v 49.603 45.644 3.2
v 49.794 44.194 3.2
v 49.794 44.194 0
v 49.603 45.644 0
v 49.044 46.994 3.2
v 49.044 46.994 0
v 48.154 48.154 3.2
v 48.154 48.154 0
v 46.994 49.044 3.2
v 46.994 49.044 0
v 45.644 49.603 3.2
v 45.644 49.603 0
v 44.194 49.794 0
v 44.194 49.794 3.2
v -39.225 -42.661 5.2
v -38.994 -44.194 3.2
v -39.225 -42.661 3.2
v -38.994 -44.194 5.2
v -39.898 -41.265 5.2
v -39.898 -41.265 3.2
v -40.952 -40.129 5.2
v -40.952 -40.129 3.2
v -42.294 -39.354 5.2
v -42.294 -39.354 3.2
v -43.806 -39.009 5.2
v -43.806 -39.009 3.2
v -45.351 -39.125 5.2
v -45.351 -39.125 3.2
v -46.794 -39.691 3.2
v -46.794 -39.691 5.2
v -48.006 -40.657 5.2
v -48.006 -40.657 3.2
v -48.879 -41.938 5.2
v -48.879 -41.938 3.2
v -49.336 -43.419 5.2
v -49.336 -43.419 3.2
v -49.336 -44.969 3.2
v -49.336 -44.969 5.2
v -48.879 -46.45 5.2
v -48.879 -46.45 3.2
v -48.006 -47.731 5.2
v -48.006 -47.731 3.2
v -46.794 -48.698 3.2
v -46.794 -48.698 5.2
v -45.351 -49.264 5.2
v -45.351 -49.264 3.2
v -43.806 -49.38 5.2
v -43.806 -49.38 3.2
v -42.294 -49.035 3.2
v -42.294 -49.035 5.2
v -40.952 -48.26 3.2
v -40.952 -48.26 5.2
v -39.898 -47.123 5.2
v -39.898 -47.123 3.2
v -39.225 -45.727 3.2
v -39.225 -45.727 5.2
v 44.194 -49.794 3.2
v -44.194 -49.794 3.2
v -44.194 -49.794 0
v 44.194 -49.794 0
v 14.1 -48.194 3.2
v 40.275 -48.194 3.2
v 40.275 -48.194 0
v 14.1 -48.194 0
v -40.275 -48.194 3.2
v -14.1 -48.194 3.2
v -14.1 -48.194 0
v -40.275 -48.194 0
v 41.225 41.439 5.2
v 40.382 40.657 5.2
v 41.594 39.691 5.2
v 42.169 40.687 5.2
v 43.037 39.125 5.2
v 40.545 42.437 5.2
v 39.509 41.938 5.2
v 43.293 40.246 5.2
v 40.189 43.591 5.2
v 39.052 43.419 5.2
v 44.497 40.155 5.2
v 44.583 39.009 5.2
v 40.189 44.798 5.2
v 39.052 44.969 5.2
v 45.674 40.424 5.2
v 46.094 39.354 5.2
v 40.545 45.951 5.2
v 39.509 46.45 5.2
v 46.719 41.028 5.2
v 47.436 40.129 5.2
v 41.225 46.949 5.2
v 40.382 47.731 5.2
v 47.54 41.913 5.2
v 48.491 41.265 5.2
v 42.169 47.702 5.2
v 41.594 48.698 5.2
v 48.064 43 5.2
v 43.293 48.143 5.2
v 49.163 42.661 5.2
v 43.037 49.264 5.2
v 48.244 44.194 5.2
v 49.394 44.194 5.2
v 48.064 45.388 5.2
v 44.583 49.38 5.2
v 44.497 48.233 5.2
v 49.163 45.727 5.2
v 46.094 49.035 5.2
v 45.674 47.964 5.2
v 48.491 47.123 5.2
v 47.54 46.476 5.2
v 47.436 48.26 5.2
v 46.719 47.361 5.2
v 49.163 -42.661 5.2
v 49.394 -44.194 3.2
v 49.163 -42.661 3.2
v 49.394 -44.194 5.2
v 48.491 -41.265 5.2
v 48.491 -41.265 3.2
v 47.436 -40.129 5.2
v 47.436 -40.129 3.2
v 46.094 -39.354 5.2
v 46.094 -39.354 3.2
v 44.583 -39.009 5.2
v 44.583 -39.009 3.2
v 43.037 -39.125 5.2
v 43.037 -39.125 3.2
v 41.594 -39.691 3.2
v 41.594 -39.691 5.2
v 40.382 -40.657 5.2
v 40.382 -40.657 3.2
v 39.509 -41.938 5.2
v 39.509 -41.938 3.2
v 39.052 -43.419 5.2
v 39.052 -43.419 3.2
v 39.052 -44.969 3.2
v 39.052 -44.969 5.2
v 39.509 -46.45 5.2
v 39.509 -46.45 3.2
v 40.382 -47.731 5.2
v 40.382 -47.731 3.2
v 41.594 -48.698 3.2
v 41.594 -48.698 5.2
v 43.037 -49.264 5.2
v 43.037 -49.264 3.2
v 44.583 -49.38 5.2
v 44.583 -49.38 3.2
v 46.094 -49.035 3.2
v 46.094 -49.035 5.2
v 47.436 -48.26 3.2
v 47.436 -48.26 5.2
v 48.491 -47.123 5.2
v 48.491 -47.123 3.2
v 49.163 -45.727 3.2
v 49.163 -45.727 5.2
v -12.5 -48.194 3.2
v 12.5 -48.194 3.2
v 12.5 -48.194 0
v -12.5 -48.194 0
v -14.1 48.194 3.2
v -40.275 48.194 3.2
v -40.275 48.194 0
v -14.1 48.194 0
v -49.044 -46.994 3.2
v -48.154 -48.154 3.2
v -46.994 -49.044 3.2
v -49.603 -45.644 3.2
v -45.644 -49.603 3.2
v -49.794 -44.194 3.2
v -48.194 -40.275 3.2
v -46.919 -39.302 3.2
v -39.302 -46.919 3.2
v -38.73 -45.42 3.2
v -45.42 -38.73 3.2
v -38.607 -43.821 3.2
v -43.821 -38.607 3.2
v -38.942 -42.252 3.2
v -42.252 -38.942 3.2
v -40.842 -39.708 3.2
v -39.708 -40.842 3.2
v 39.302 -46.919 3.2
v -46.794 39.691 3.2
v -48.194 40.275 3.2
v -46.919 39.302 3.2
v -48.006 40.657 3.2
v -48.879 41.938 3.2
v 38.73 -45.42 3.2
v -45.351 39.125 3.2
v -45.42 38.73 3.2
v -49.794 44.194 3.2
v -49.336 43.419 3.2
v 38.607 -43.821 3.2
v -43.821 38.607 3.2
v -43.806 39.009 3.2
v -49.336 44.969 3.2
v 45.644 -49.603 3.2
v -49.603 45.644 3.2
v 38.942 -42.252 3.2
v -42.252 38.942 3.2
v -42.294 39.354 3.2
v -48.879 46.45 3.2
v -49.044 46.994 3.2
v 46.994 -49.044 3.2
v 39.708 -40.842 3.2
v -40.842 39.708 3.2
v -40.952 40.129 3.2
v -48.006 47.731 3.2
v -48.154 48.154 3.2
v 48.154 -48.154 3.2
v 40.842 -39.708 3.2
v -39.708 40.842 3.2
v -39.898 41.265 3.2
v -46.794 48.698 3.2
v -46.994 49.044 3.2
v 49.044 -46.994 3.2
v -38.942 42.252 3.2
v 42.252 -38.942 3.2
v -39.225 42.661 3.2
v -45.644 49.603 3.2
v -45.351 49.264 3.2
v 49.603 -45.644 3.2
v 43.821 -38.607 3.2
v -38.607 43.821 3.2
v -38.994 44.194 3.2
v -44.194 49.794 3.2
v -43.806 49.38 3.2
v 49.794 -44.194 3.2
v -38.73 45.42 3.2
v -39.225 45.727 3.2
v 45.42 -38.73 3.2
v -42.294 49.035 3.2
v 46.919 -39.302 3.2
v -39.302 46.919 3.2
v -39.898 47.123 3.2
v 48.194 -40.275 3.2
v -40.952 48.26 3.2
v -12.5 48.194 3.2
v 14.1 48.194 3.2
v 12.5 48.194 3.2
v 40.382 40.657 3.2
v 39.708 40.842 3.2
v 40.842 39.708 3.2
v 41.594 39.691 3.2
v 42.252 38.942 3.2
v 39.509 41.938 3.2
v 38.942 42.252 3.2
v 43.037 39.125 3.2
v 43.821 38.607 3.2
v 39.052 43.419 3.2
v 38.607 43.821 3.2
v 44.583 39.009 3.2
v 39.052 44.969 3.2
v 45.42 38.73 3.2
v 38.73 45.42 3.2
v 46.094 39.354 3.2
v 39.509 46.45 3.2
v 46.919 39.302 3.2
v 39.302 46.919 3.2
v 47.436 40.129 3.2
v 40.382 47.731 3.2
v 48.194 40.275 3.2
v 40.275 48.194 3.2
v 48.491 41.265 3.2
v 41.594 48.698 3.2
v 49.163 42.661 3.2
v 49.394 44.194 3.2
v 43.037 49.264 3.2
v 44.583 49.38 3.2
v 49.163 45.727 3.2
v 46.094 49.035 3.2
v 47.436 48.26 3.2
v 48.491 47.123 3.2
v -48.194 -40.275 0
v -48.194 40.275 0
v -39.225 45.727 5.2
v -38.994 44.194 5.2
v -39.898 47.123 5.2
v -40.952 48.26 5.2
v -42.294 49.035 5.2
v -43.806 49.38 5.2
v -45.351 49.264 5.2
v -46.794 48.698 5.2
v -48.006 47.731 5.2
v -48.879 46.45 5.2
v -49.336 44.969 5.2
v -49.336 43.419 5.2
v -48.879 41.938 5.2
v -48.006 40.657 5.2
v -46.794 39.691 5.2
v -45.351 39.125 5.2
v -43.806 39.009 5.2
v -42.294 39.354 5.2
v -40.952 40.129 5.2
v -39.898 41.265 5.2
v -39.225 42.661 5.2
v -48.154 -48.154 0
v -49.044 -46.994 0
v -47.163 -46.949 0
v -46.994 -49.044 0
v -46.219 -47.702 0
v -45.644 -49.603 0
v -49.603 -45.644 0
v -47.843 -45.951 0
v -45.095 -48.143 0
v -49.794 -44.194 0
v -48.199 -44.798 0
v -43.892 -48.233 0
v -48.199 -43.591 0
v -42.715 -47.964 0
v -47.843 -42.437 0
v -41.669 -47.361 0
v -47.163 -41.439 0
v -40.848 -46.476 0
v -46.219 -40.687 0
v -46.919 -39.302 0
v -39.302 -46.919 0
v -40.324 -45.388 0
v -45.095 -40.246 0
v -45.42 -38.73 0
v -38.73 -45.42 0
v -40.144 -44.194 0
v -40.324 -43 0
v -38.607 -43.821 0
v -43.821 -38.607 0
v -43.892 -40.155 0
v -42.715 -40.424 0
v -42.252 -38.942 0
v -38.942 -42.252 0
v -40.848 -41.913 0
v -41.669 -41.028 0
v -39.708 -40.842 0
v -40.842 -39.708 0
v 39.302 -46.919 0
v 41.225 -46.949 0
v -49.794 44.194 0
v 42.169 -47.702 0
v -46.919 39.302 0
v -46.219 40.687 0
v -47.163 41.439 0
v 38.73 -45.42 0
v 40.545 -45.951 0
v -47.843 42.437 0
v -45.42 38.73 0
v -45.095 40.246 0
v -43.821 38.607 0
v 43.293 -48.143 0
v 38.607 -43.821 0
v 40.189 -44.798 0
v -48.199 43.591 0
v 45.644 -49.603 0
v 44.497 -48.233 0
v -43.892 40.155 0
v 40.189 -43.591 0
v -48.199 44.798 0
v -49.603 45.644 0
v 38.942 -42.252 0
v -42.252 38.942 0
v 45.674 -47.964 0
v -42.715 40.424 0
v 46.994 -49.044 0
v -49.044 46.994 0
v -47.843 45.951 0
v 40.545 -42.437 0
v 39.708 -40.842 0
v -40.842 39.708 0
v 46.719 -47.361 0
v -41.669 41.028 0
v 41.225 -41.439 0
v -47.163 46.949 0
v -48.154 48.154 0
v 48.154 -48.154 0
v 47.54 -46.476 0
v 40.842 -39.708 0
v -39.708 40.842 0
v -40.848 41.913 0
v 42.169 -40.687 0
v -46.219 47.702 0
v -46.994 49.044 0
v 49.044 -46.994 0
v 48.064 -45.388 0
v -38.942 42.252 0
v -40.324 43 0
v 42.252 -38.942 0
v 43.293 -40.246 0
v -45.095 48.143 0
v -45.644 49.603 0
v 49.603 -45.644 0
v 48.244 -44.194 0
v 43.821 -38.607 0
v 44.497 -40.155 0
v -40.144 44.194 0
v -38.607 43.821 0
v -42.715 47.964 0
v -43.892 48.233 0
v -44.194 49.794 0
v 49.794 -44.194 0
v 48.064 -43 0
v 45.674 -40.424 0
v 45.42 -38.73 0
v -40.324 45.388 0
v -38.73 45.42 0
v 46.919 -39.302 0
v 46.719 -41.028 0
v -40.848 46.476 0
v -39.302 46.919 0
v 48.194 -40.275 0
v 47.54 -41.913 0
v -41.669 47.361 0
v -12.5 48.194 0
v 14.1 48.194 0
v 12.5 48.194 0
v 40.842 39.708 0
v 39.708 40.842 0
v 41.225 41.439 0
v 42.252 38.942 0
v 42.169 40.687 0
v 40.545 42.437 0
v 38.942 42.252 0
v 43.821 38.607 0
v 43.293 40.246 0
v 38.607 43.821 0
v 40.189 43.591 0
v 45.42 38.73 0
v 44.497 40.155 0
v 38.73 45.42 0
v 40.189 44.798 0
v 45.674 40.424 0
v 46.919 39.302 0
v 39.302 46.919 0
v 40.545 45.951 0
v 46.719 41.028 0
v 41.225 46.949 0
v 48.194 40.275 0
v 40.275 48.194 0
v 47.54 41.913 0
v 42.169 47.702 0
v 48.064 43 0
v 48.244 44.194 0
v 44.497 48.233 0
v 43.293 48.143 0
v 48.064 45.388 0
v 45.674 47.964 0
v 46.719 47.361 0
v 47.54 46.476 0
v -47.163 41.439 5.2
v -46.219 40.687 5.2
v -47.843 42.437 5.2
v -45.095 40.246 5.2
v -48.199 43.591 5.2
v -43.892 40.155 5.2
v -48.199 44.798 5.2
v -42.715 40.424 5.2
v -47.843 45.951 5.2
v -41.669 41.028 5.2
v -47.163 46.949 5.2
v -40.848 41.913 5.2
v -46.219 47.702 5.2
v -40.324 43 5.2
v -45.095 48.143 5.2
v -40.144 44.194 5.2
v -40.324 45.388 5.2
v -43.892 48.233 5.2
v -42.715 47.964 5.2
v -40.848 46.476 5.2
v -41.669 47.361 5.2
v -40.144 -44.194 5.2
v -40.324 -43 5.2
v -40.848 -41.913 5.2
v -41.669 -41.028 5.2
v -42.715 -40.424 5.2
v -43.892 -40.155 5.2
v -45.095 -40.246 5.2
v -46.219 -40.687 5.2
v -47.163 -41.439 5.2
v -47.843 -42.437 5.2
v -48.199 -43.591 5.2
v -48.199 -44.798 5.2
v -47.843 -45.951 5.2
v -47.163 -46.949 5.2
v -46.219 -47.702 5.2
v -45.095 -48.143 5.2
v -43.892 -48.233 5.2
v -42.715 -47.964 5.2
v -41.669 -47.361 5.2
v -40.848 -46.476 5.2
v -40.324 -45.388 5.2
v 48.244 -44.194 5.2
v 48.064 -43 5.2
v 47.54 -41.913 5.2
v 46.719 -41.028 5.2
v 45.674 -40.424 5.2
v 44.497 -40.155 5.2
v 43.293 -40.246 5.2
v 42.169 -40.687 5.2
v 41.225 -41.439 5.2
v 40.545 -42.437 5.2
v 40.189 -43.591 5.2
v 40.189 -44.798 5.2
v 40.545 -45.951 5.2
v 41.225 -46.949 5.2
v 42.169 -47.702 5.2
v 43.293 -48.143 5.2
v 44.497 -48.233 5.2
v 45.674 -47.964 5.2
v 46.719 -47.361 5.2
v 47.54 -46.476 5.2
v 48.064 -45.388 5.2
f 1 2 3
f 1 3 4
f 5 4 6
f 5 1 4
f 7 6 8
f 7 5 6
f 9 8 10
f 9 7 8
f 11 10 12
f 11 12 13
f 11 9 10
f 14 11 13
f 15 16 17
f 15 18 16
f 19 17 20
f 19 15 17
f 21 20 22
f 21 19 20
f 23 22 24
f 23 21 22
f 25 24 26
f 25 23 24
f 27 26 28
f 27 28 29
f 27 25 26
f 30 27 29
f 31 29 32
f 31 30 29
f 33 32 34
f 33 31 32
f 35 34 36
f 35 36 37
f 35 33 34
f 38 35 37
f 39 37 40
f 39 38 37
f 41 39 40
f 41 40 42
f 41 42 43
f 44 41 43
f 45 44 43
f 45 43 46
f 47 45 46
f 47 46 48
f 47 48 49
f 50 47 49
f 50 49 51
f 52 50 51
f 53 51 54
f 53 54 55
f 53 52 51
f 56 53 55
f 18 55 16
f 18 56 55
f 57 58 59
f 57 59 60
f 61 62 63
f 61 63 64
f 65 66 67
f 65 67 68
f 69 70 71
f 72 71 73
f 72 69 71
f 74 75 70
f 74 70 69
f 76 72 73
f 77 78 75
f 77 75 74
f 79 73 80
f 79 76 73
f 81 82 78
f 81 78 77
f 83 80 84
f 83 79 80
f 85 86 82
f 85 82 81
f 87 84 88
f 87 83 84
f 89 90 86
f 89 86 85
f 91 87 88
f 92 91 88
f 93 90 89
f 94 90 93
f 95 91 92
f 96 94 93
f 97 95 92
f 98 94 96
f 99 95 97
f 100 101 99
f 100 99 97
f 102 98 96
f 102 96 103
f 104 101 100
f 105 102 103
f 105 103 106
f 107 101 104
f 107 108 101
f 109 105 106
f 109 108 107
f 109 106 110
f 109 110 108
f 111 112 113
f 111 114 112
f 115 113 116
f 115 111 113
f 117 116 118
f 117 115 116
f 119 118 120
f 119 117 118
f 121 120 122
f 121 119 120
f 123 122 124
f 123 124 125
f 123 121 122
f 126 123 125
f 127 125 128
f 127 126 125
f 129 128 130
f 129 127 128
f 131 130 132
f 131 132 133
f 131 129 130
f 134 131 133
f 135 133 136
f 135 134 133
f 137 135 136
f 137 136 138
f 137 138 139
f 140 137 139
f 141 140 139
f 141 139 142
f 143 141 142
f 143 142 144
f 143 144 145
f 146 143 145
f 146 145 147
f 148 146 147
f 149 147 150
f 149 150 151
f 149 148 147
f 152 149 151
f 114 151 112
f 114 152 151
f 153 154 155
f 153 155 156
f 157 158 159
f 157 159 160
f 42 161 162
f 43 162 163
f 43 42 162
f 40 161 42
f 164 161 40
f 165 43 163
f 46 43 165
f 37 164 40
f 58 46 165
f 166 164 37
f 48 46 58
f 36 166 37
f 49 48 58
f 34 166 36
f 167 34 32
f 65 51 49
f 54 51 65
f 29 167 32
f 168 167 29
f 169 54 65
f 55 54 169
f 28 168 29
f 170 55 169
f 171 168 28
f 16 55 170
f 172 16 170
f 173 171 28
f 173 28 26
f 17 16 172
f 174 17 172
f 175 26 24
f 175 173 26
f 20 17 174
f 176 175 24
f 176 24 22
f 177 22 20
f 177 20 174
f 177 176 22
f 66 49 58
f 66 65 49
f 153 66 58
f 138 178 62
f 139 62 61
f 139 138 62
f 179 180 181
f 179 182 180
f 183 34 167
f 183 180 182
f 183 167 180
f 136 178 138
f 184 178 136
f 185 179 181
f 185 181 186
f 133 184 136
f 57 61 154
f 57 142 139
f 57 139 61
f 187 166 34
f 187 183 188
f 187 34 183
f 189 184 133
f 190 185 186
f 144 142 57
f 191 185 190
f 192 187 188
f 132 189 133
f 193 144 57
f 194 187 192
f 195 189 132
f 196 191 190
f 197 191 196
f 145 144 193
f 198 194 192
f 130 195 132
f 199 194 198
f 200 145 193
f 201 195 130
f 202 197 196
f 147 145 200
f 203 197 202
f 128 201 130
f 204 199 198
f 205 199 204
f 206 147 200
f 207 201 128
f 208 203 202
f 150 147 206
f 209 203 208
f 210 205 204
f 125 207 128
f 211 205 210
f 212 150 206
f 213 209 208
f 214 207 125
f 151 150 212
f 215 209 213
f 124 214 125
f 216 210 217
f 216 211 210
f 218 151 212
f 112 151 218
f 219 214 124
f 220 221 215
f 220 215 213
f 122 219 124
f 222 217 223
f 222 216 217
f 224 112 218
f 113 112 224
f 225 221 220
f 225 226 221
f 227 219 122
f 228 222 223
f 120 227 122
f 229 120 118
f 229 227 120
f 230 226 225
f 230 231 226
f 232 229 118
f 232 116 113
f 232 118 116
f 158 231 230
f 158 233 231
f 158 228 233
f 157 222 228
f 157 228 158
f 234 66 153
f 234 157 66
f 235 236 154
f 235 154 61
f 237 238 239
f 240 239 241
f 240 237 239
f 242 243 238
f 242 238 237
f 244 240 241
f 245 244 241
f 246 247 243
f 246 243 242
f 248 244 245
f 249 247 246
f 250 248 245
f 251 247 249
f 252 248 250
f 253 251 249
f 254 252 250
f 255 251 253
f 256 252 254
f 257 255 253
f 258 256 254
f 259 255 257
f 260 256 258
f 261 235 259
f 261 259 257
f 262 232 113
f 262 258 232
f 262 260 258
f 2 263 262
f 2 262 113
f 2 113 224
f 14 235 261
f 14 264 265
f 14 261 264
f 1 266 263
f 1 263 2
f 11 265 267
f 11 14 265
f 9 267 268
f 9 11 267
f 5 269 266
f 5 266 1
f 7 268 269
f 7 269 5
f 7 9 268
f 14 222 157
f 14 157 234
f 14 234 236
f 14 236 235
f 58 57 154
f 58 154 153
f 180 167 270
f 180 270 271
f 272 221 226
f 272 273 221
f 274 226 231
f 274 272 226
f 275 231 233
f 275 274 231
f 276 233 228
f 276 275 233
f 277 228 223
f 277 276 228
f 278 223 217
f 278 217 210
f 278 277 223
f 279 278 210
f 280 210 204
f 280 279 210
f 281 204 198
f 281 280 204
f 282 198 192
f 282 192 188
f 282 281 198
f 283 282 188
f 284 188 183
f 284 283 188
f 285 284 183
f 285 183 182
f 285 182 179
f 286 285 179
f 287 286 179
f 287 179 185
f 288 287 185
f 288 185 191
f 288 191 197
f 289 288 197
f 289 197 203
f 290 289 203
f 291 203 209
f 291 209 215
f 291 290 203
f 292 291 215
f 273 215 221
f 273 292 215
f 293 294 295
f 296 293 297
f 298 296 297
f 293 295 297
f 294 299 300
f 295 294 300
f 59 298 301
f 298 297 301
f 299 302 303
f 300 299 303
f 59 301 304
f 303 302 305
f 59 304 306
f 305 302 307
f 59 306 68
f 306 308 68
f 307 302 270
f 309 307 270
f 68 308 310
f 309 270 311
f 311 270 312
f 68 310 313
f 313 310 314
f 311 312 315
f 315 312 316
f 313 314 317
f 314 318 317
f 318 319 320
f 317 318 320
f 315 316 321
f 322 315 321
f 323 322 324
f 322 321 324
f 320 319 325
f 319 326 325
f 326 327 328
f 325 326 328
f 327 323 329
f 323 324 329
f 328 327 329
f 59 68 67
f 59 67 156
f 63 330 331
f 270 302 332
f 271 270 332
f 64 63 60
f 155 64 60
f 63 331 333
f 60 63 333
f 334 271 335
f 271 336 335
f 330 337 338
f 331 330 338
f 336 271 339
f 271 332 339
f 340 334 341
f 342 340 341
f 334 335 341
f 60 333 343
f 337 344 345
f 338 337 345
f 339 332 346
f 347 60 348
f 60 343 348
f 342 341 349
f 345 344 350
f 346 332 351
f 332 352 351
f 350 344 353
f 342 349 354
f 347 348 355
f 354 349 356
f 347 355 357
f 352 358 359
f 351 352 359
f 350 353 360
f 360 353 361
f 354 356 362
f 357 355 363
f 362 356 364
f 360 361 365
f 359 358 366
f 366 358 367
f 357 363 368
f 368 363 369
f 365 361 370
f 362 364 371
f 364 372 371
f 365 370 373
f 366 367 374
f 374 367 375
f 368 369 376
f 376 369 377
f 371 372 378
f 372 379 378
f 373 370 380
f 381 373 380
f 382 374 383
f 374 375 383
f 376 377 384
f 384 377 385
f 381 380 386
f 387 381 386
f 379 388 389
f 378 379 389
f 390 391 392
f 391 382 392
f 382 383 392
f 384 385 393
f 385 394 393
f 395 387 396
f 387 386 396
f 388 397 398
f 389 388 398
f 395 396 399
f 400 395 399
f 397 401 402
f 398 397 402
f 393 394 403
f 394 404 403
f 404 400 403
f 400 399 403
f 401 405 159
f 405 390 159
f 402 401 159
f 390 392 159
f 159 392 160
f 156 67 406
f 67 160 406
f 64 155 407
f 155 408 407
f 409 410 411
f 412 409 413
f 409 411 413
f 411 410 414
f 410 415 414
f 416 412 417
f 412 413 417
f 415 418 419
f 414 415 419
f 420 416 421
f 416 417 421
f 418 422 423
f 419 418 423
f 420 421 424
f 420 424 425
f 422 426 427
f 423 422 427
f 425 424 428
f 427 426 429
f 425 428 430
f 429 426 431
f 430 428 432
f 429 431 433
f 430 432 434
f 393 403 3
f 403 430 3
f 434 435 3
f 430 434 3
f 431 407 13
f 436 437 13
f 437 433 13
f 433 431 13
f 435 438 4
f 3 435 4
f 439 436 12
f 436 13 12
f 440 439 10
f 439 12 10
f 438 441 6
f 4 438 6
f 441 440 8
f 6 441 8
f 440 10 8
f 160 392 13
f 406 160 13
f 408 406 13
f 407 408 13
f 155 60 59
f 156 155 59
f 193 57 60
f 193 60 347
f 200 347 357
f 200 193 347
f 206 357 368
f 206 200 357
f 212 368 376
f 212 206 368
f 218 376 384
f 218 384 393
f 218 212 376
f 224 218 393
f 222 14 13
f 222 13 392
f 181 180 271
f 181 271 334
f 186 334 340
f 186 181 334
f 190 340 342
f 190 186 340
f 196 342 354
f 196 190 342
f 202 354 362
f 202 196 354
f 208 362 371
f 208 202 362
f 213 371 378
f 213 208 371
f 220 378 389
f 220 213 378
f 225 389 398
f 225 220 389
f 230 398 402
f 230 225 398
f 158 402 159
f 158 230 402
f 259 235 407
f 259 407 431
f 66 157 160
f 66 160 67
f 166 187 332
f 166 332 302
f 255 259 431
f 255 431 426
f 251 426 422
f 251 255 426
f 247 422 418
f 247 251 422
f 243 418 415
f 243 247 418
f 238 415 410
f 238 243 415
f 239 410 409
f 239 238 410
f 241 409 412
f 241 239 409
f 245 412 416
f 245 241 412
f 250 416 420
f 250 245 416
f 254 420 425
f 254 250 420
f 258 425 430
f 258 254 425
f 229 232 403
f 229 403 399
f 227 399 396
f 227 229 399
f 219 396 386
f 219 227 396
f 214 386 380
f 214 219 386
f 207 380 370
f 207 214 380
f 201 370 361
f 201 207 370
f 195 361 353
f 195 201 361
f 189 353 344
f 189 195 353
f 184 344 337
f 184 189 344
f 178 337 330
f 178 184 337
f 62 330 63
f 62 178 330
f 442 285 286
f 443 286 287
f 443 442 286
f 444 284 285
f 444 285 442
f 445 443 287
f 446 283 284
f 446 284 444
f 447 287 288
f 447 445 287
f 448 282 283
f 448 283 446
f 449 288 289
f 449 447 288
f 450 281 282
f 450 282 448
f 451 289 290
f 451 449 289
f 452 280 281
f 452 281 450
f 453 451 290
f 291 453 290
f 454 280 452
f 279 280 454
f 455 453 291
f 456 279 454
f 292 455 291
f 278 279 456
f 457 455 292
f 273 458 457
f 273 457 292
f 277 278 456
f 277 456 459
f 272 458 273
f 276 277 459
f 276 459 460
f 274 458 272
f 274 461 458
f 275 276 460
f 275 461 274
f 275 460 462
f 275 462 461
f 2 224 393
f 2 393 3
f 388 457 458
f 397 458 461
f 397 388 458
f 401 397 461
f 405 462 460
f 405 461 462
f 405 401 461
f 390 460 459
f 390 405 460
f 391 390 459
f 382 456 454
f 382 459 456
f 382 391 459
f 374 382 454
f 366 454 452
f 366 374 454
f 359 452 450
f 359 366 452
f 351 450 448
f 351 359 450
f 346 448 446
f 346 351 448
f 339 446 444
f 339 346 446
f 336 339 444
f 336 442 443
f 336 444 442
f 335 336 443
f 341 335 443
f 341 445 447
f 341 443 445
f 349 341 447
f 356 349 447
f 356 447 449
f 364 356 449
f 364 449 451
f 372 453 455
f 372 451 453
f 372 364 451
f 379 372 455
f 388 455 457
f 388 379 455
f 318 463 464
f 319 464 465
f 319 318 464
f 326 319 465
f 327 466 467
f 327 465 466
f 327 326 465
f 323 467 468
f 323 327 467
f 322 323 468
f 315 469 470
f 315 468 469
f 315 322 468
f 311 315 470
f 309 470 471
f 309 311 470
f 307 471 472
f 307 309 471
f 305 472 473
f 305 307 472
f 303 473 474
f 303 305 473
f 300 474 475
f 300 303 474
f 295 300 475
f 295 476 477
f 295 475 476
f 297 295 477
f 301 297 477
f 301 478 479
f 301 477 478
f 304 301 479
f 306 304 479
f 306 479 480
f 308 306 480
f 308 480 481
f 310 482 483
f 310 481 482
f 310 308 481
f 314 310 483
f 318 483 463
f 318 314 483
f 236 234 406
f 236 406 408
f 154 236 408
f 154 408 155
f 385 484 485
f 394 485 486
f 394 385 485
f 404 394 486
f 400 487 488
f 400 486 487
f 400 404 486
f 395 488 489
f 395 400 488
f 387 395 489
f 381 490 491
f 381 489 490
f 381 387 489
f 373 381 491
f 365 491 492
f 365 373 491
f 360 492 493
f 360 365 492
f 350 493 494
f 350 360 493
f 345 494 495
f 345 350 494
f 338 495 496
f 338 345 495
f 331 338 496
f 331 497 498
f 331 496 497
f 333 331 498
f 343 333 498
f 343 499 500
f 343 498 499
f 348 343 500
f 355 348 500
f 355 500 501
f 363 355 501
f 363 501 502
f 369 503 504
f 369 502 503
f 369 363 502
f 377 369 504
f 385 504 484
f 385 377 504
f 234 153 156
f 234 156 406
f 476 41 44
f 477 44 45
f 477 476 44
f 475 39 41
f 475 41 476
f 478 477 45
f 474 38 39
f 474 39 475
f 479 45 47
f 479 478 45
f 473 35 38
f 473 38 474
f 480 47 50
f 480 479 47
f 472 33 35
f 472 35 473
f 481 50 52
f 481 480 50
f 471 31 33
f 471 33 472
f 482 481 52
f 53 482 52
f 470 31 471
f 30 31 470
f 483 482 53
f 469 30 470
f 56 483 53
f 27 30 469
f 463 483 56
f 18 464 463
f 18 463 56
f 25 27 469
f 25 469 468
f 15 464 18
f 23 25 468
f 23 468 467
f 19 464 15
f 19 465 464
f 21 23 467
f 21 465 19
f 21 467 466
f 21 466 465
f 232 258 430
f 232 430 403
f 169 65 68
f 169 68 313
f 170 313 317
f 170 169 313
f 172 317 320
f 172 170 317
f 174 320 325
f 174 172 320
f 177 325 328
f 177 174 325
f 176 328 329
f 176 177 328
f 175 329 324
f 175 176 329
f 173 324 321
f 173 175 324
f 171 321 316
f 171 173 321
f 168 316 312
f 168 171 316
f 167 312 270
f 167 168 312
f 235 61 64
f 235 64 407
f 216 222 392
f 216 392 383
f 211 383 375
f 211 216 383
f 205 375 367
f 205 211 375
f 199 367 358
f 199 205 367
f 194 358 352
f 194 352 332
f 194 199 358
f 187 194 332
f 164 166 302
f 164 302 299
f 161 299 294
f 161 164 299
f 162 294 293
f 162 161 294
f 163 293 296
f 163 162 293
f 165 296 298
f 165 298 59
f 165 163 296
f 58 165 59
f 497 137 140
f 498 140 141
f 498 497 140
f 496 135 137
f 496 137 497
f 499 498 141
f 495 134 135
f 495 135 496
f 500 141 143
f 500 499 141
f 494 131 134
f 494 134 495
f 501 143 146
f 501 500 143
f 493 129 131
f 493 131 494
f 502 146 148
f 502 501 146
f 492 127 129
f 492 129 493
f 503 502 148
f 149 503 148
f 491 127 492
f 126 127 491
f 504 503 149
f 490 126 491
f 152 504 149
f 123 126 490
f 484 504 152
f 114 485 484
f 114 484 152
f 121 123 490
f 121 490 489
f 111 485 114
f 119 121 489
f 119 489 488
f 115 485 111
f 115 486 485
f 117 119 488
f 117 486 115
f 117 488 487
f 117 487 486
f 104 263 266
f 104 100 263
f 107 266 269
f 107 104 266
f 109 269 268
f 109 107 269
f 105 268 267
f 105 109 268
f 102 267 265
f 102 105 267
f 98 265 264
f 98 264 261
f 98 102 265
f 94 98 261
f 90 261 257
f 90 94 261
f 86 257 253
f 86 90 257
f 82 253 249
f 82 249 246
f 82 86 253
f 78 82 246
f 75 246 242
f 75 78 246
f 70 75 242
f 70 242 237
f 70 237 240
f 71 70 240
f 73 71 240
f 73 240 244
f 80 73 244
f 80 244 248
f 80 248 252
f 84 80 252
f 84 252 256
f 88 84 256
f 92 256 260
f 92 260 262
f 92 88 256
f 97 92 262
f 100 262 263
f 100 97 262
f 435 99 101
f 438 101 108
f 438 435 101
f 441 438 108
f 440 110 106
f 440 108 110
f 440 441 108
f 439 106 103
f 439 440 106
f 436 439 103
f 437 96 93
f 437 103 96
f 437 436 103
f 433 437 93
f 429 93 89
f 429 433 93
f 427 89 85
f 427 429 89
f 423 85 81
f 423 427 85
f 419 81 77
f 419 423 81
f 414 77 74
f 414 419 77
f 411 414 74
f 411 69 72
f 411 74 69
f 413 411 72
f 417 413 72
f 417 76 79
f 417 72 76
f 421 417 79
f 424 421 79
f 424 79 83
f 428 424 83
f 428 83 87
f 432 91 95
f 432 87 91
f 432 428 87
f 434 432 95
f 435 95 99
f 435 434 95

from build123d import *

# Parameters (mm, degrees)
F3_W     = 1.6
F3_H     = 96.388348
F4_R     = 5.2
F5_R     = 4.05
F8_DEPTH = 5.201


with BuildPart() as f6:
    # F6: sweep along a path in F1
    with BuildLine(Plane.XZ) as f6_path:
        Line((0, 0), (0, 0.6))
        Line((0, 0.6), (0, 3.2))
    # F2 (on Top) + F3 (on Top) → F6 (sweep)
    with BuildSketch(Plane.XY):
        with BuildLine():
            ThreePointArc((49.794174, 44.194174), (48.153972, 48.153972), (44.194174, 49.794174))
            Line((44.194174, 49.794174), (0, 49.794174))
            Line((0, 49.794174), (-44.194174, 49.794174))
            ThreePointArc((-44.194174, 49.794174), (-48.153972, 48.153972), (-49.794174, 44.194174))
            Line((-49.794174, 44.194174), (-49.794174, 0))
            Line((-49.794174, 0), (-49.794174, -44.194174))
            ThreePointArc((-49.794174, -44.194174), (-48.153972, -48.153972), (-44.194174, -49.794174))
            Line((-44.194174, -49.794174), (0, -49.794174))
            Line((0, -49.794174), (44.194174, -49.794174))
            ThreePointArc((44.194174, -49.794174), (48.153972, -48.153972), (49.794174, -44.194174))
            Line((49.794174, -44.194174), (49.794174, 0))
            Line((49.794174, 0), (49.794174, 44.194174))
        make_face()
        with BuildLine():
            Line((0, 48.194174), (40.27499, 48.194174))
            ThreePointArc((40.27499, 48.194174), (40.234376, 40.234376), (48.194174, 40.27499))
            Line((48.194174, 40.27499), (48.194174, 0))
            Line((48.194174, 0), (48.194174, -40.27499))
            ThreePointArc((48.194174, -40.27499), (40.234376, -40.234376), (40.27499, -48.194174))
            Line((40.27499, -48.194174), (0, -48.194174))
            Line((0, -48.194174), (-40.27499, -48.194174))
            ThreePointArc((-40.27499, -48.194174), (-40.234376, -40.234376), (-48.194174, -40.27499))
            Line((-48.194174, -40.27499), (-48.194174, 0))
            Line((-48.194174, 0), (-48.194174, 40.27499))
            ThreePointArc((-48.194174, 40.27499), (-40.234376, 40.234376), (-40.27499, 48.194174))
            Line((-40.27499, 48.194174), (0, 48.194174))
        make_face(mode=Mode.SUBTRACT)
    with BuildSketch(Plane.XY):
        with Locations((-13.3, 0)):
            Rectangle(F3_W, F3_H)
        with Locations((13.3, 0)):
            Rectangle(F3_W, F3_H)
    sweep(path=f6_path.line)

    # F7: sweep along a path in F1
    with BuildLine(Plane.XZ) as f7_path:
        Line((0, 0), (0, 0.6))
        Line((0, 0.6), (0, 3.2))
        Line((0, 3.2), (0, 5.2))
    # F4 (on Top) → F7 (sweep)
    with BuildSketch(Plane.XY):
        with Locations((44.194174, 44.194174)):
            Circle(F4_R)
        with Locations((-44.194174, 44.194174)):
            Circle(F4_R)
        with Locations((-44.194174, -44.194174)):
            Circle(F4_R)
        with Locations((44.194174, -44.194174)):
            Circle(F4_R)
    sweep(path=f7_path.line)

    # F5 (on Top) → F8 (cut, through all)
    with BuildSketch(Plane.XY):
        with Locations((44.194174, 44.194174)):
            Circle(F5_R)
        with Locations((-44.194174, 44.194174)):
            Circle(F5_R)
        with Locations((-44.194174, -44.194174)):
            Circle(F5_R)
        with Locations((44.194174, -44.194174)):
            Circle(F5_R)
    extrude(amount=F8_DEPTH, mode=Mode.SUBTRACT)


solid = f6.part
